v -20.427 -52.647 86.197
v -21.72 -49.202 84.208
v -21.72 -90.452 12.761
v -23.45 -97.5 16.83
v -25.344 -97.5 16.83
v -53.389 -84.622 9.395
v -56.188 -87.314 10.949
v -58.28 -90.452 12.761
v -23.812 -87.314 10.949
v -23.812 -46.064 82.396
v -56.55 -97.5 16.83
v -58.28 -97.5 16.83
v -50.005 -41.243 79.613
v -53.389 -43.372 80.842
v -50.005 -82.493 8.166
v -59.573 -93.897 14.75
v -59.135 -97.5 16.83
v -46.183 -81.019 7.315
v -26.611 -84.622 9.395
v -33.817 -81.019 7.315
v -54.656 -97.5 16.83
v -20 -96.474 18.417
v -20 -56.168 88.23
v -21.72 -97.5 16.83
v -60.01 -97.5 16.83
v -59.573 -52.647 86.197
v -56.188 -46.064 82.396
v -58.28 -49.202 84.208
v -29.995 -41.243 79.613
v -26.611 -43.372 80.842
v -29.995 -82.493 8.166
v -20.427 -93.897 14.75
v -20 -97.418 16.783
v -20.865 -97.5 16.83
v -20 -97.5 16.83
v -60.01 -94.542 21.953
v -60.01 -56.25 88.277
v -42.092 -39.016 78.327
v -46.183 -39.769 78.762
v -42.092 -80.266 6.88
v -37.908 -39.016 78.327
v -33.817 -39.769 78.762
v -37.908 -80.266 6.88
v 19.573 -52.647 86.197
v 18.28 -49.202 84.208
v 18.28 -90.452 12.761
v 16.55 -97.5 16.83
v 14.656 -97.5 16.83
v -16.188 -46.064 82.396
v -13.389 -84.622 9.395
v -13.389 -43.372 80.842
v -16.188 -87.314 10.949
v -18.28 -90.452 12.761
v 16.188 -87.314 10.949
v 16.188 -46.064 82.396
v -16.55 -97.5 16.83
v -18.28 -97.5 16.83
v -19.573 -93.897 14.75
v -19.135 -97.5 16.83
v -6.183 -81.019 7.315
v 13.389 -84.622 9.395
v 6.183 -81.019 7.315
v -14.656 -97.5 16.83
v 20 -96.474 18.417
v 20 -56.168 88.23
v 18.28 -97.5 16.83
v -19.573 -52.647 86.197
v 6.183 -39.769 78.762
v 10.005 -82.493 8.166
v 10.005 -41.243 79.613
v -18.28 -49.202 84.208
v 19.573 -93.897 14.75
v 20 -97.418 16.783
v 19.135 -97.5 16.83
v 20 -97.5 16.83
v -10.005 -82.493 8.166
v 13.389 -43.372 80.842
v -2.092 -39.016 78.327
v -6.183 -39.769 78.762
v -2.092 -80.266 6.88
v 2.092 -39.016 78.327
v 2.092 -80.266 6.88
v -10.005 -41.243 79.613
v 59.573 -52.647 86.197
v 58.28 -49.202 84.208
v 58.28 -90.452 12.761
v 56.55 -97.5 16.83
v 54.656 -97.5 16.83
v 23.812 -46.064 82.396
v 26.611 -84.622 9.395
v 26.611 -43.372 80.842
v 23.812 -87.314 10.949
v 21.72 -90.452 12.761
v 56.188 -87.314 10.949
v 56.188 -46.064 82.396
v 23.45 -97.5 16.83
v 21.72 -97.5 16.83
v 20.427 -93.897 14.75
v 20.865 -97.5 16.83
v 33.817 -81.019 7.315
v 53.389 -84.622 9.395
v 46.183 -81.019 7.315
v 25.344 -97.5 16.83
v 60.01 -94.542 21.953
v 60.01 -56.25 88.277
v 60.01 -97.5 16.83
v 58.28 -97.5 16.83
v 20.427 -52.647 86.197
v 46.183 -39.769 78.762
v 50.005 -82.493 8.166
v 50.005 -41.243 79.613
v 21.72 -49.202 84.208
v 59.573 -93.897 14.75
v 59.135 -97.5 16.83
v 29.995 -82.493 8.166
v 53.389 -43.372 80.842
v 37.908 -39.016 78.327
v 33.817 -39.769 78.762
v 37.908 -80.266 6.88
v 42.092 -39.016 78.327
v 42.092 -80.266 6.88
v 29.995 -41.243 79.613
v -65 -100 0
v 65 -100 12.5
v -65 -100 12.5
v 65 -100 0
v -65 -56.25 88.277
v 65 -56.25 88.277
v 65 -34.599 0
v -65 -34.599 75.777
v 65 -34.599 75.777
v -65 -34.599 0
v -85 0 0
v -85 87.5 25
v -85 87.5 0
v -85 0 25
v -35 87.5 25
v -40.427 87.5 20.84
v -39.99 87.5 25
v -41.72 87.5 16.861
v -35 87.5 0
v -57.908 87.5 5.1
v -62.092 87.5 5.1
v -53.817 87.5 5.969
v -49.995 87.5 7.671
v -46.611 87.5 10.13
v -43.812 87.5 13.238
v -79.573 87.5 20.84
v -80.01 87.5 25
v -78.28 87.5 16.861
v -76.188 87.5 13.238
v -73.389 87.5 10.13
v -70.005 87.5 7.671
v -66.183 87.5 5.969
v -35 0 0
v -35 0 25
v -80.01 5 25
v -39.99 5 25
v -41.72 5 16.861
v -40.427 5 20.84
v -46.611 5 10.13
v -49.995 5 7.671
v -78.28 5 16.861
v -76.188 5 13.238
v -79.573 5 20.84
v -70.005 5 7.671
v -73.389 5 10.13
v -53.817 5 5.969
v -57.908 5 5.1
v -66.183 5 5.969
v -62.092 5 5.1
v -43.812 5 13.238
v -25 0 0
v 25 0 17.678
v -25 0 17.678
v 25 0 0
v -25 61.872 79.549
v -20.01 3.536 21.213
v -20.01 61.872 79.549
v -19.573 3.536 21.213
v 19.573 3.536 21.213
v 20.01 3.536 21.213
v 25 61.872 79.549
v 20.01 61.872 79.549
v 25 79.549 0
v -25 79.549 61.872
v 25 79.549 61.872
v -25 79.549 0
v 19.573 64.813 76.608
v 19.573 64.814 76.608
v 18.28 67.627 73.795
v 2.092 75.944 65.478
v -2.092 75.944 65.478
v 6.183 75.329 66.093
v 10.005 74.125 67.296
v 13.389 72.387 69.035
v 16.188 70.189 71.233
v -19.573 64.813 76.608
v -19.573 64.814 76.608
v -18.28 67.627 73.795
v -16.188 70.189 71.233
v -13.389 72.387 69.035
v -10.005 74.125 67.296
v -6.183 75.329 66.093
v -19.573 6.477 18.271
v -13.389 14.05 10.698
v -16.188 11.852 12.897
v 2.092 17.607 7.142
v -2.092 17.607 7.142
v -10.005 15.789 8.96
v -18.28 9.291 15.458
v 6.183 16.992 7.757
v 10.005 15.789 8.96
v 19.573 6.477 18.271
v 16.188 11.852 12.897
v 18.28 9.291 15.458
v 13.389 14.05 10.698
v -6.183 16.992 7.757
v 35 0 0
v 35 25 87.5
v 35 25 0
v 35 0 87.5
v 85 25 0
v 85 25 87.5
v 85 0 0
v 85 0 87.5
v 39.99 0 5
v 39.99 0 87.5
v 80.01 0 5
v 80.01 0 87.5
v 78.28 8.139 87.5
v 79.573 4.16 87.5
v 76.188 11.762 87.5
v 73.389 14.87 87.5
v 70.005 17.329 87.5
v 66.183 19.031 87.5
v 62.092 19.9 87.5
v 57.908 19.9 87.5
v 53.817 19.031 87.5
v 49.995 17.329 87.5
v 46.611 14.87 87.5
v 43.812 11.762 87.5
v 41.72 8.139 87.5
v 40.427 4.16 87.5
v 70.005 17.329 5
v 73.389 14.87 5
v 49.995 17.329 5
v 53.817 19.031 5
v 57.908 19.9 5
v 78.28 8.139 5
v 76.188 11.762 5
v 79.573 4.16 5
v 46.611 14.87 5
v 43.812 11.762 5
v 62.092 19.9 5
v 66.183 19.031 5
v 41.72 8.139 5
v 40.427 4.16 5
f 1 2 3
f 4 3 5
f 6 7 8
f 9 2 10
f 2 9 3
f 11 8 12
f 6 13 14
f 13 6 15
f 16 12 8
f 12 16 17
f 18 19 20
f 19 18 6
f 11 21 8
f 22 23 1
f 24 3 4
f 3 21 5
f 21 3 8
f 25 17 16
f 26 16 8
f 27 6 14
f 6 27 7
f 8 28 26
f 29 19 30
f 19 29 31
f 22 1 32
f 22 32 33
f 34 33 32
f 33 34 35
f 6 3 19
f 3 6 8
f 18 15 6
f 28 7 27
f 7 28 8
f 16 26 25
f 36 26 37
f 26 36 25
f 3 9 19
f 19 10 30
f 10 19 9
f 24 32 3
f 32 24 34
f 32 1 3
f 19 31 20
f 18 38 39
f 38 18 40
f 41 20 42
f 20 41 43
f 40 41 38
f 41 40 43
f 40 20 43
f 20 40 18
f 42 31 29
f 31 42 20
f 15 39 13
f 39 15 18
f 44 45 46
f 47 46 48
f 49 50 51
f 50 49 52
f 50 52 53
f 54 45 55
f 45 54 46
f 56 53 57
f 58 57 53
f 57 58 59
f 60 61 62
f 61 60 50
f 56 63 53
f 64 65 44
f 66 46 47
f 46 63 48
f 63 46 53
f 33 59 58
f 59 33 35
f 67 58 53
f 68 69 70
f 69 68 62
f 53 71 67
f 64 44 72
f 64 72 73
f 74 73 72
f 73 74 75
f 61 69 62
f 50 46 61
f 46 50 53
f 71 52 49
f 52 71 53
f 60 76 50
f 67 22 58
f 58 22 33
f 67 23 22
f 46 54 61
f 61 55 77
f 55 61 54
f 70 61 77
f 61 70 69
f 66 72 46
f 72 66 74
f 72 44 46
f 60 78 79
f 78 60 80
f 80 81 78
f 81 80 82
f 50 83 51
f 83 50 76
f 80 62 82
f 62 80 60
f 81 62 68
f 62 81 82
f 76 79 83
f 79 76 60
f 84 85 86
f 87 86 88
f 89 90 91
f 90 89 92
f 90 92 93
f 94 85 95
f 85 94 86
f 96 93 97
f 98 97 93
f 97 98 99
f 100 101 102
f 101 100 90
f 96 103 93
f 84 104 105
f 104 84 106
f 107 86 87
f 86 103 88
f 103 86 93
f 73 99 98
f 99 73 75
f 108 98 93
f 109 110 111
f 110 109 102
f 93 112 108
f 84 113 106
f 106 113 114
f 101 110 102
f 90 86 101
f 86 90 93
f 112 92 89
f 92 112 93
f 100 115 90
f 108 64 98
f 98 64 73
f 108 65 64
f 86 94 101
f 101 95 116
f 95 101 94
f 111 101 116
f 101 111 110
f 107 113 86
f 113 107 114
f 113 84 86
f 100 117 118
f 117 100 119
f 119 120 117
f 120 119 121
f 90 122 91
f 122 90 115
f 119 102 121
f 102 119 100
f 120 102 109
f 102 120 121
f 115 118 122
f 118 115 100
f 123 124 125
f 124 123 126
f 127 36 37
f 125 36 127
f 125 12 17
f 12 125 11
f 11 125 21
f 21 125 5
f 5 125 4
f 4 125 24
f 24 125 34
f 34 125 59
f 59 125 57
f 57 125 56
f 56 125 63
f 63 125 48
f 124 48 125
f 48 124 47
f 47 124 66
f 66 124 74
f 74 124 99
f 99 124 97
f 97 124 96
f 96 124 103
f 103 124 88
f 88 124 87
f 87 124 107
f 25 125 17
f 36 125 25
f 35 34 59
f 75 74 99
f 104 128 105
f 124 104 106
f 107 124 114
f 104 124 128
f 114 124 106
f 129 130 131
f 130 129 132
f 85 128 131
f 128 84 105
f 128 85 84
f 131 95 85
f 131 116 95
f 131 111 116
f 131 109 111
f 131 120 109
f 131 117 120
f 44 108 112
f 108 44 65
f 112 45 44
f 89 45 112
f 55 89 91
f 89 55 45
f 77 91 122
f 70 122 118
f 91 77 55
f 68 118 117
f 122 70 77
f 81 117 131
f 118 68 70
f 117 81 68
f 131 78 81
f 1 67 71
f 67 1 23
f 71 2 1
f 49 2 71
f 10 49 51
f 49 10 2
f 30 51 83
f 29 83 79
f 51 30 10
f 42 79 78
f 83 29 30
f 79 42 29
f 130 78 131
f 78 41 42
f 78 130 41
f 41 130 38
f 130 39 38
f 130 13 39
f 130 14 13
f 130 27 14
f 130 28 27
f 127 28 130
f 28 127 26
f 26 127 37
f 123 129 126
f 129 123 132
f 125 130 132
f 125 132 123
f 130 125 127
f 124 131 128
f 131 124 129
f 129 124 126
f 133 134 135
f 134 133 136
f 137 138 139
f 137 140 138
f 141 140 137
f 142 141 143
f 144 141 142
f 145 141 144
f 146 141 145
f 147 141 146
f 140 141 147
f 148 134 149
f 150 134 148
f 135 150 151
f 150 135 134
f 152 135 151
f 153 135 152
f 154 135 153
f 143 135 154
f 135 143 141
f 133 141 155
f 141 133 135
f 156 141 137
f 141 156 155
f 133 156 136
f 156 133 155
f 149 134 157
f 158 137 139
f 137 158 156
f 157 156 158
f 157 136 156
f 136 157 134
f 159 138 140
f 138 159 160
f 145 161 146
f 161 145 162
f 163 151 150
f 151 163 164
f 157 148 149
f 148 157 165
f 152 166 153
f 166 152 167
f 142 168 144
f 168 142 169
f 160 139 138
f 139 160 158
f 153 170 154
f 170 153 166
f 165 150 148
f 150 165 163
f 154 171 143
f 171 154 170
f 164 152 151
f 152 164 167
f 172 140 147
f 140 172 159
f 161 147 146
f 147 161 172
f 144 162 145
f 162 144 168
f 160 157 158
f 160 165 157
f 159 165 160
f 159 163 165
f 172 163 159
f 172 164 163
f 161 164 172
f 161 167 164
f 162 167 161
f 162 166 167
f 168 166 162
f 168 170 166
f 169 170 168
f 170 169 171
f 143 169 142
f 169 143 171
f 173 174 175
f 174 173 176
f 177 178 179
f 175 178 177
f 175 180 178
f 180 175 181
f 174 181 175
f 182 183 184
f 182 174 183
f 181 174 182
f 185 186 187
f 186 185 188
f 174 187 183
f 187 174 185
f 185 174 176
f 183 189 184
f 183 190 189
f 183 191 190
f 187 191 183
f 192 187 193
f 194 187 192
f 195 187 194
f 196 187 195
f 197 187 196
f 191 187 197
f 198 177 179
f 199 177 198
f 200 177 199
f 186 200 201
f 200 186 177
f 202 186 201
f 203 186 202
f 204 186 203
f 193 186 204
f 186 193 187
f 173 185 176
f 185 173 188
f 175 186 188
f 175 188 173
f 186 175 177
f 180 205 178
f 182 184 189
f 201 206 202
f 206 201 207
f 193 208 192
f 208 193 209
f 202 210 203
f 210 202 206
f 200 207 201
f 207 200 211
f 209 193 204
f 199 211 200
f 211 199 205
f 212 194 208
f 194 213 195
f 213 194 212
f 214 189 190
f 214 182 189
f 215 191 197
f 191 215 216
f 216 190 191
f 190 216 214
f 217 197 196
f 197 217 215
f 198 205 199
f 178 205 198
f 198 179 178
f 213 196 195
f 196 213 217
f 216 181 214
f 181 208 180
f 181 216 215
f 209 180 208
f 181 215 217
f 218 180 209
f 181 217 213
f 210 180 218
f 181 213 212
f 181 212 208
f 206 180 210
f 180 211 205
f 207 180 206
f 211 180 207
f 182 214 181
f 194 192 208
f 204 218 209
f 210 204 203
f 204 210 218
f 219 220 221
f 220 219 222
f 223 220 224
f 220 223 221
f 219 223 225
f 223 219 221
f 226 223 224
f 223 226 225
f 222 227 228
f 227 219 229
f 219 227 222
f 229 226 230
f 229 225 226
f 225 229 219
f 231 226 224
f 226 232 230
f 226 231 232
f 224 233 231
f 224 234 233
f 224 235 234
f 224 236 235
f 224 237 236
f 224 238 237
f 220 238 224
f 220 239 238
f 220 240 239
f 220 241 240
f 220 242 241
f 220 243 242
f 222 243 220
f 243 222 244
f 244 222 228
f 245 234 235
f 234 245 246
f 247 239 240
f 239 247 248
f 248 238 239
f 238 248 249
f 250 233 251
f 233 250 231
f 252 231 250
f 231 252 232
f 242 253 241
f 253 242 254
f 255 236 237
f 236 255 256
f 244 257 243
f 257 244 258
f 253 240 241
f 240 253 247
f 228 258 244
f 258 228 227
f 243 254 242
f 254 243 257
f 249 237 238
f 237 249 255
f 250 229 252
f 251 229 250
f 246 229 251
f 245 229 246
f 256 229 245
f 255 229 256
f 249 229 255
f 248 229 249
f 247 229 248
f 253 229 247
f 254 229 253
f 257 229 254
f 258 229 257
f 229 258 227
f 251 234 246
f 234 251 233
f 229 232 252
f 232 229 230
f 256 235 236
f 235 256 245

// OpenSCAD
// file: config.scad
default_token_radius = 10;
default_token_height = 4;
default_token_hole_margin = 0.2;
eps = 0.01;
// main file
include <config.scad>;
casino_chip_radius = 40/2;
casino_chip_height = 3.3;
min_thickness = 5;

module casino_chip_tray(angle,length, columns=1) {
    width = casino_chip_radius*2*columns + min_thickness*2;
    //height = cos(angle)*(casino_chip_radius + min_thickness) +
    module base() {
        rotate([90, 0, 90])linear_extrude(width, center=true) polygon([
            [0, 0],
            [0, cos(angle) * (casino_chip_radius + min_thickness)],
            [cos(angle)*(length+min_thickness), cos(angle) * (casino_chip_radius + min_thickness) +sin(angle) * (length + min_thickness)],
            [sin(angle)*(casino_chip_radius + min_thickness) + cos(angle) * (length + min_thickness), sin(angle)*(length + min_thickness)],
            [sin(angle)*(casino_chip_radius + min_thickness) + cos(angle) * (length+ min_thickness), 0]
        
        ]);
    }
    module groove() {
         translate([0, 0, cos(angle) * (casino_chip_radius + min_thickness)]) rotate([90-angle, 0, 180]) translate([0, 0, min_thickness]) cylinder(h=(length+eps), r=casino_chip_radius + eps, center=false);
    } 
    difference(){
        base();
        translate([-width/2 + min_thickness + casino_chip_radius, 0, 0]){
            for( i= [1:columns]){
                translate([(i-1)*casino_chip_radius*2, 0, 0]) groove();
            }
        }    
    }
}
translate([0, -100, 0]) casino_chip_tray(angle=60, length = casino_chip_height*25, columns=3);
translate([-60, 0, 0]) casino_chip_tray(angle = 0, length = casino_chip_height * 25 );
translate([0, 0, 0]) casino_chip_tray(angle = 45, length = casino_chip_height * 25);
translate([60, 0, 0]) casino_chip_tray(angle = 90, length = casino_chip_height * 25);
